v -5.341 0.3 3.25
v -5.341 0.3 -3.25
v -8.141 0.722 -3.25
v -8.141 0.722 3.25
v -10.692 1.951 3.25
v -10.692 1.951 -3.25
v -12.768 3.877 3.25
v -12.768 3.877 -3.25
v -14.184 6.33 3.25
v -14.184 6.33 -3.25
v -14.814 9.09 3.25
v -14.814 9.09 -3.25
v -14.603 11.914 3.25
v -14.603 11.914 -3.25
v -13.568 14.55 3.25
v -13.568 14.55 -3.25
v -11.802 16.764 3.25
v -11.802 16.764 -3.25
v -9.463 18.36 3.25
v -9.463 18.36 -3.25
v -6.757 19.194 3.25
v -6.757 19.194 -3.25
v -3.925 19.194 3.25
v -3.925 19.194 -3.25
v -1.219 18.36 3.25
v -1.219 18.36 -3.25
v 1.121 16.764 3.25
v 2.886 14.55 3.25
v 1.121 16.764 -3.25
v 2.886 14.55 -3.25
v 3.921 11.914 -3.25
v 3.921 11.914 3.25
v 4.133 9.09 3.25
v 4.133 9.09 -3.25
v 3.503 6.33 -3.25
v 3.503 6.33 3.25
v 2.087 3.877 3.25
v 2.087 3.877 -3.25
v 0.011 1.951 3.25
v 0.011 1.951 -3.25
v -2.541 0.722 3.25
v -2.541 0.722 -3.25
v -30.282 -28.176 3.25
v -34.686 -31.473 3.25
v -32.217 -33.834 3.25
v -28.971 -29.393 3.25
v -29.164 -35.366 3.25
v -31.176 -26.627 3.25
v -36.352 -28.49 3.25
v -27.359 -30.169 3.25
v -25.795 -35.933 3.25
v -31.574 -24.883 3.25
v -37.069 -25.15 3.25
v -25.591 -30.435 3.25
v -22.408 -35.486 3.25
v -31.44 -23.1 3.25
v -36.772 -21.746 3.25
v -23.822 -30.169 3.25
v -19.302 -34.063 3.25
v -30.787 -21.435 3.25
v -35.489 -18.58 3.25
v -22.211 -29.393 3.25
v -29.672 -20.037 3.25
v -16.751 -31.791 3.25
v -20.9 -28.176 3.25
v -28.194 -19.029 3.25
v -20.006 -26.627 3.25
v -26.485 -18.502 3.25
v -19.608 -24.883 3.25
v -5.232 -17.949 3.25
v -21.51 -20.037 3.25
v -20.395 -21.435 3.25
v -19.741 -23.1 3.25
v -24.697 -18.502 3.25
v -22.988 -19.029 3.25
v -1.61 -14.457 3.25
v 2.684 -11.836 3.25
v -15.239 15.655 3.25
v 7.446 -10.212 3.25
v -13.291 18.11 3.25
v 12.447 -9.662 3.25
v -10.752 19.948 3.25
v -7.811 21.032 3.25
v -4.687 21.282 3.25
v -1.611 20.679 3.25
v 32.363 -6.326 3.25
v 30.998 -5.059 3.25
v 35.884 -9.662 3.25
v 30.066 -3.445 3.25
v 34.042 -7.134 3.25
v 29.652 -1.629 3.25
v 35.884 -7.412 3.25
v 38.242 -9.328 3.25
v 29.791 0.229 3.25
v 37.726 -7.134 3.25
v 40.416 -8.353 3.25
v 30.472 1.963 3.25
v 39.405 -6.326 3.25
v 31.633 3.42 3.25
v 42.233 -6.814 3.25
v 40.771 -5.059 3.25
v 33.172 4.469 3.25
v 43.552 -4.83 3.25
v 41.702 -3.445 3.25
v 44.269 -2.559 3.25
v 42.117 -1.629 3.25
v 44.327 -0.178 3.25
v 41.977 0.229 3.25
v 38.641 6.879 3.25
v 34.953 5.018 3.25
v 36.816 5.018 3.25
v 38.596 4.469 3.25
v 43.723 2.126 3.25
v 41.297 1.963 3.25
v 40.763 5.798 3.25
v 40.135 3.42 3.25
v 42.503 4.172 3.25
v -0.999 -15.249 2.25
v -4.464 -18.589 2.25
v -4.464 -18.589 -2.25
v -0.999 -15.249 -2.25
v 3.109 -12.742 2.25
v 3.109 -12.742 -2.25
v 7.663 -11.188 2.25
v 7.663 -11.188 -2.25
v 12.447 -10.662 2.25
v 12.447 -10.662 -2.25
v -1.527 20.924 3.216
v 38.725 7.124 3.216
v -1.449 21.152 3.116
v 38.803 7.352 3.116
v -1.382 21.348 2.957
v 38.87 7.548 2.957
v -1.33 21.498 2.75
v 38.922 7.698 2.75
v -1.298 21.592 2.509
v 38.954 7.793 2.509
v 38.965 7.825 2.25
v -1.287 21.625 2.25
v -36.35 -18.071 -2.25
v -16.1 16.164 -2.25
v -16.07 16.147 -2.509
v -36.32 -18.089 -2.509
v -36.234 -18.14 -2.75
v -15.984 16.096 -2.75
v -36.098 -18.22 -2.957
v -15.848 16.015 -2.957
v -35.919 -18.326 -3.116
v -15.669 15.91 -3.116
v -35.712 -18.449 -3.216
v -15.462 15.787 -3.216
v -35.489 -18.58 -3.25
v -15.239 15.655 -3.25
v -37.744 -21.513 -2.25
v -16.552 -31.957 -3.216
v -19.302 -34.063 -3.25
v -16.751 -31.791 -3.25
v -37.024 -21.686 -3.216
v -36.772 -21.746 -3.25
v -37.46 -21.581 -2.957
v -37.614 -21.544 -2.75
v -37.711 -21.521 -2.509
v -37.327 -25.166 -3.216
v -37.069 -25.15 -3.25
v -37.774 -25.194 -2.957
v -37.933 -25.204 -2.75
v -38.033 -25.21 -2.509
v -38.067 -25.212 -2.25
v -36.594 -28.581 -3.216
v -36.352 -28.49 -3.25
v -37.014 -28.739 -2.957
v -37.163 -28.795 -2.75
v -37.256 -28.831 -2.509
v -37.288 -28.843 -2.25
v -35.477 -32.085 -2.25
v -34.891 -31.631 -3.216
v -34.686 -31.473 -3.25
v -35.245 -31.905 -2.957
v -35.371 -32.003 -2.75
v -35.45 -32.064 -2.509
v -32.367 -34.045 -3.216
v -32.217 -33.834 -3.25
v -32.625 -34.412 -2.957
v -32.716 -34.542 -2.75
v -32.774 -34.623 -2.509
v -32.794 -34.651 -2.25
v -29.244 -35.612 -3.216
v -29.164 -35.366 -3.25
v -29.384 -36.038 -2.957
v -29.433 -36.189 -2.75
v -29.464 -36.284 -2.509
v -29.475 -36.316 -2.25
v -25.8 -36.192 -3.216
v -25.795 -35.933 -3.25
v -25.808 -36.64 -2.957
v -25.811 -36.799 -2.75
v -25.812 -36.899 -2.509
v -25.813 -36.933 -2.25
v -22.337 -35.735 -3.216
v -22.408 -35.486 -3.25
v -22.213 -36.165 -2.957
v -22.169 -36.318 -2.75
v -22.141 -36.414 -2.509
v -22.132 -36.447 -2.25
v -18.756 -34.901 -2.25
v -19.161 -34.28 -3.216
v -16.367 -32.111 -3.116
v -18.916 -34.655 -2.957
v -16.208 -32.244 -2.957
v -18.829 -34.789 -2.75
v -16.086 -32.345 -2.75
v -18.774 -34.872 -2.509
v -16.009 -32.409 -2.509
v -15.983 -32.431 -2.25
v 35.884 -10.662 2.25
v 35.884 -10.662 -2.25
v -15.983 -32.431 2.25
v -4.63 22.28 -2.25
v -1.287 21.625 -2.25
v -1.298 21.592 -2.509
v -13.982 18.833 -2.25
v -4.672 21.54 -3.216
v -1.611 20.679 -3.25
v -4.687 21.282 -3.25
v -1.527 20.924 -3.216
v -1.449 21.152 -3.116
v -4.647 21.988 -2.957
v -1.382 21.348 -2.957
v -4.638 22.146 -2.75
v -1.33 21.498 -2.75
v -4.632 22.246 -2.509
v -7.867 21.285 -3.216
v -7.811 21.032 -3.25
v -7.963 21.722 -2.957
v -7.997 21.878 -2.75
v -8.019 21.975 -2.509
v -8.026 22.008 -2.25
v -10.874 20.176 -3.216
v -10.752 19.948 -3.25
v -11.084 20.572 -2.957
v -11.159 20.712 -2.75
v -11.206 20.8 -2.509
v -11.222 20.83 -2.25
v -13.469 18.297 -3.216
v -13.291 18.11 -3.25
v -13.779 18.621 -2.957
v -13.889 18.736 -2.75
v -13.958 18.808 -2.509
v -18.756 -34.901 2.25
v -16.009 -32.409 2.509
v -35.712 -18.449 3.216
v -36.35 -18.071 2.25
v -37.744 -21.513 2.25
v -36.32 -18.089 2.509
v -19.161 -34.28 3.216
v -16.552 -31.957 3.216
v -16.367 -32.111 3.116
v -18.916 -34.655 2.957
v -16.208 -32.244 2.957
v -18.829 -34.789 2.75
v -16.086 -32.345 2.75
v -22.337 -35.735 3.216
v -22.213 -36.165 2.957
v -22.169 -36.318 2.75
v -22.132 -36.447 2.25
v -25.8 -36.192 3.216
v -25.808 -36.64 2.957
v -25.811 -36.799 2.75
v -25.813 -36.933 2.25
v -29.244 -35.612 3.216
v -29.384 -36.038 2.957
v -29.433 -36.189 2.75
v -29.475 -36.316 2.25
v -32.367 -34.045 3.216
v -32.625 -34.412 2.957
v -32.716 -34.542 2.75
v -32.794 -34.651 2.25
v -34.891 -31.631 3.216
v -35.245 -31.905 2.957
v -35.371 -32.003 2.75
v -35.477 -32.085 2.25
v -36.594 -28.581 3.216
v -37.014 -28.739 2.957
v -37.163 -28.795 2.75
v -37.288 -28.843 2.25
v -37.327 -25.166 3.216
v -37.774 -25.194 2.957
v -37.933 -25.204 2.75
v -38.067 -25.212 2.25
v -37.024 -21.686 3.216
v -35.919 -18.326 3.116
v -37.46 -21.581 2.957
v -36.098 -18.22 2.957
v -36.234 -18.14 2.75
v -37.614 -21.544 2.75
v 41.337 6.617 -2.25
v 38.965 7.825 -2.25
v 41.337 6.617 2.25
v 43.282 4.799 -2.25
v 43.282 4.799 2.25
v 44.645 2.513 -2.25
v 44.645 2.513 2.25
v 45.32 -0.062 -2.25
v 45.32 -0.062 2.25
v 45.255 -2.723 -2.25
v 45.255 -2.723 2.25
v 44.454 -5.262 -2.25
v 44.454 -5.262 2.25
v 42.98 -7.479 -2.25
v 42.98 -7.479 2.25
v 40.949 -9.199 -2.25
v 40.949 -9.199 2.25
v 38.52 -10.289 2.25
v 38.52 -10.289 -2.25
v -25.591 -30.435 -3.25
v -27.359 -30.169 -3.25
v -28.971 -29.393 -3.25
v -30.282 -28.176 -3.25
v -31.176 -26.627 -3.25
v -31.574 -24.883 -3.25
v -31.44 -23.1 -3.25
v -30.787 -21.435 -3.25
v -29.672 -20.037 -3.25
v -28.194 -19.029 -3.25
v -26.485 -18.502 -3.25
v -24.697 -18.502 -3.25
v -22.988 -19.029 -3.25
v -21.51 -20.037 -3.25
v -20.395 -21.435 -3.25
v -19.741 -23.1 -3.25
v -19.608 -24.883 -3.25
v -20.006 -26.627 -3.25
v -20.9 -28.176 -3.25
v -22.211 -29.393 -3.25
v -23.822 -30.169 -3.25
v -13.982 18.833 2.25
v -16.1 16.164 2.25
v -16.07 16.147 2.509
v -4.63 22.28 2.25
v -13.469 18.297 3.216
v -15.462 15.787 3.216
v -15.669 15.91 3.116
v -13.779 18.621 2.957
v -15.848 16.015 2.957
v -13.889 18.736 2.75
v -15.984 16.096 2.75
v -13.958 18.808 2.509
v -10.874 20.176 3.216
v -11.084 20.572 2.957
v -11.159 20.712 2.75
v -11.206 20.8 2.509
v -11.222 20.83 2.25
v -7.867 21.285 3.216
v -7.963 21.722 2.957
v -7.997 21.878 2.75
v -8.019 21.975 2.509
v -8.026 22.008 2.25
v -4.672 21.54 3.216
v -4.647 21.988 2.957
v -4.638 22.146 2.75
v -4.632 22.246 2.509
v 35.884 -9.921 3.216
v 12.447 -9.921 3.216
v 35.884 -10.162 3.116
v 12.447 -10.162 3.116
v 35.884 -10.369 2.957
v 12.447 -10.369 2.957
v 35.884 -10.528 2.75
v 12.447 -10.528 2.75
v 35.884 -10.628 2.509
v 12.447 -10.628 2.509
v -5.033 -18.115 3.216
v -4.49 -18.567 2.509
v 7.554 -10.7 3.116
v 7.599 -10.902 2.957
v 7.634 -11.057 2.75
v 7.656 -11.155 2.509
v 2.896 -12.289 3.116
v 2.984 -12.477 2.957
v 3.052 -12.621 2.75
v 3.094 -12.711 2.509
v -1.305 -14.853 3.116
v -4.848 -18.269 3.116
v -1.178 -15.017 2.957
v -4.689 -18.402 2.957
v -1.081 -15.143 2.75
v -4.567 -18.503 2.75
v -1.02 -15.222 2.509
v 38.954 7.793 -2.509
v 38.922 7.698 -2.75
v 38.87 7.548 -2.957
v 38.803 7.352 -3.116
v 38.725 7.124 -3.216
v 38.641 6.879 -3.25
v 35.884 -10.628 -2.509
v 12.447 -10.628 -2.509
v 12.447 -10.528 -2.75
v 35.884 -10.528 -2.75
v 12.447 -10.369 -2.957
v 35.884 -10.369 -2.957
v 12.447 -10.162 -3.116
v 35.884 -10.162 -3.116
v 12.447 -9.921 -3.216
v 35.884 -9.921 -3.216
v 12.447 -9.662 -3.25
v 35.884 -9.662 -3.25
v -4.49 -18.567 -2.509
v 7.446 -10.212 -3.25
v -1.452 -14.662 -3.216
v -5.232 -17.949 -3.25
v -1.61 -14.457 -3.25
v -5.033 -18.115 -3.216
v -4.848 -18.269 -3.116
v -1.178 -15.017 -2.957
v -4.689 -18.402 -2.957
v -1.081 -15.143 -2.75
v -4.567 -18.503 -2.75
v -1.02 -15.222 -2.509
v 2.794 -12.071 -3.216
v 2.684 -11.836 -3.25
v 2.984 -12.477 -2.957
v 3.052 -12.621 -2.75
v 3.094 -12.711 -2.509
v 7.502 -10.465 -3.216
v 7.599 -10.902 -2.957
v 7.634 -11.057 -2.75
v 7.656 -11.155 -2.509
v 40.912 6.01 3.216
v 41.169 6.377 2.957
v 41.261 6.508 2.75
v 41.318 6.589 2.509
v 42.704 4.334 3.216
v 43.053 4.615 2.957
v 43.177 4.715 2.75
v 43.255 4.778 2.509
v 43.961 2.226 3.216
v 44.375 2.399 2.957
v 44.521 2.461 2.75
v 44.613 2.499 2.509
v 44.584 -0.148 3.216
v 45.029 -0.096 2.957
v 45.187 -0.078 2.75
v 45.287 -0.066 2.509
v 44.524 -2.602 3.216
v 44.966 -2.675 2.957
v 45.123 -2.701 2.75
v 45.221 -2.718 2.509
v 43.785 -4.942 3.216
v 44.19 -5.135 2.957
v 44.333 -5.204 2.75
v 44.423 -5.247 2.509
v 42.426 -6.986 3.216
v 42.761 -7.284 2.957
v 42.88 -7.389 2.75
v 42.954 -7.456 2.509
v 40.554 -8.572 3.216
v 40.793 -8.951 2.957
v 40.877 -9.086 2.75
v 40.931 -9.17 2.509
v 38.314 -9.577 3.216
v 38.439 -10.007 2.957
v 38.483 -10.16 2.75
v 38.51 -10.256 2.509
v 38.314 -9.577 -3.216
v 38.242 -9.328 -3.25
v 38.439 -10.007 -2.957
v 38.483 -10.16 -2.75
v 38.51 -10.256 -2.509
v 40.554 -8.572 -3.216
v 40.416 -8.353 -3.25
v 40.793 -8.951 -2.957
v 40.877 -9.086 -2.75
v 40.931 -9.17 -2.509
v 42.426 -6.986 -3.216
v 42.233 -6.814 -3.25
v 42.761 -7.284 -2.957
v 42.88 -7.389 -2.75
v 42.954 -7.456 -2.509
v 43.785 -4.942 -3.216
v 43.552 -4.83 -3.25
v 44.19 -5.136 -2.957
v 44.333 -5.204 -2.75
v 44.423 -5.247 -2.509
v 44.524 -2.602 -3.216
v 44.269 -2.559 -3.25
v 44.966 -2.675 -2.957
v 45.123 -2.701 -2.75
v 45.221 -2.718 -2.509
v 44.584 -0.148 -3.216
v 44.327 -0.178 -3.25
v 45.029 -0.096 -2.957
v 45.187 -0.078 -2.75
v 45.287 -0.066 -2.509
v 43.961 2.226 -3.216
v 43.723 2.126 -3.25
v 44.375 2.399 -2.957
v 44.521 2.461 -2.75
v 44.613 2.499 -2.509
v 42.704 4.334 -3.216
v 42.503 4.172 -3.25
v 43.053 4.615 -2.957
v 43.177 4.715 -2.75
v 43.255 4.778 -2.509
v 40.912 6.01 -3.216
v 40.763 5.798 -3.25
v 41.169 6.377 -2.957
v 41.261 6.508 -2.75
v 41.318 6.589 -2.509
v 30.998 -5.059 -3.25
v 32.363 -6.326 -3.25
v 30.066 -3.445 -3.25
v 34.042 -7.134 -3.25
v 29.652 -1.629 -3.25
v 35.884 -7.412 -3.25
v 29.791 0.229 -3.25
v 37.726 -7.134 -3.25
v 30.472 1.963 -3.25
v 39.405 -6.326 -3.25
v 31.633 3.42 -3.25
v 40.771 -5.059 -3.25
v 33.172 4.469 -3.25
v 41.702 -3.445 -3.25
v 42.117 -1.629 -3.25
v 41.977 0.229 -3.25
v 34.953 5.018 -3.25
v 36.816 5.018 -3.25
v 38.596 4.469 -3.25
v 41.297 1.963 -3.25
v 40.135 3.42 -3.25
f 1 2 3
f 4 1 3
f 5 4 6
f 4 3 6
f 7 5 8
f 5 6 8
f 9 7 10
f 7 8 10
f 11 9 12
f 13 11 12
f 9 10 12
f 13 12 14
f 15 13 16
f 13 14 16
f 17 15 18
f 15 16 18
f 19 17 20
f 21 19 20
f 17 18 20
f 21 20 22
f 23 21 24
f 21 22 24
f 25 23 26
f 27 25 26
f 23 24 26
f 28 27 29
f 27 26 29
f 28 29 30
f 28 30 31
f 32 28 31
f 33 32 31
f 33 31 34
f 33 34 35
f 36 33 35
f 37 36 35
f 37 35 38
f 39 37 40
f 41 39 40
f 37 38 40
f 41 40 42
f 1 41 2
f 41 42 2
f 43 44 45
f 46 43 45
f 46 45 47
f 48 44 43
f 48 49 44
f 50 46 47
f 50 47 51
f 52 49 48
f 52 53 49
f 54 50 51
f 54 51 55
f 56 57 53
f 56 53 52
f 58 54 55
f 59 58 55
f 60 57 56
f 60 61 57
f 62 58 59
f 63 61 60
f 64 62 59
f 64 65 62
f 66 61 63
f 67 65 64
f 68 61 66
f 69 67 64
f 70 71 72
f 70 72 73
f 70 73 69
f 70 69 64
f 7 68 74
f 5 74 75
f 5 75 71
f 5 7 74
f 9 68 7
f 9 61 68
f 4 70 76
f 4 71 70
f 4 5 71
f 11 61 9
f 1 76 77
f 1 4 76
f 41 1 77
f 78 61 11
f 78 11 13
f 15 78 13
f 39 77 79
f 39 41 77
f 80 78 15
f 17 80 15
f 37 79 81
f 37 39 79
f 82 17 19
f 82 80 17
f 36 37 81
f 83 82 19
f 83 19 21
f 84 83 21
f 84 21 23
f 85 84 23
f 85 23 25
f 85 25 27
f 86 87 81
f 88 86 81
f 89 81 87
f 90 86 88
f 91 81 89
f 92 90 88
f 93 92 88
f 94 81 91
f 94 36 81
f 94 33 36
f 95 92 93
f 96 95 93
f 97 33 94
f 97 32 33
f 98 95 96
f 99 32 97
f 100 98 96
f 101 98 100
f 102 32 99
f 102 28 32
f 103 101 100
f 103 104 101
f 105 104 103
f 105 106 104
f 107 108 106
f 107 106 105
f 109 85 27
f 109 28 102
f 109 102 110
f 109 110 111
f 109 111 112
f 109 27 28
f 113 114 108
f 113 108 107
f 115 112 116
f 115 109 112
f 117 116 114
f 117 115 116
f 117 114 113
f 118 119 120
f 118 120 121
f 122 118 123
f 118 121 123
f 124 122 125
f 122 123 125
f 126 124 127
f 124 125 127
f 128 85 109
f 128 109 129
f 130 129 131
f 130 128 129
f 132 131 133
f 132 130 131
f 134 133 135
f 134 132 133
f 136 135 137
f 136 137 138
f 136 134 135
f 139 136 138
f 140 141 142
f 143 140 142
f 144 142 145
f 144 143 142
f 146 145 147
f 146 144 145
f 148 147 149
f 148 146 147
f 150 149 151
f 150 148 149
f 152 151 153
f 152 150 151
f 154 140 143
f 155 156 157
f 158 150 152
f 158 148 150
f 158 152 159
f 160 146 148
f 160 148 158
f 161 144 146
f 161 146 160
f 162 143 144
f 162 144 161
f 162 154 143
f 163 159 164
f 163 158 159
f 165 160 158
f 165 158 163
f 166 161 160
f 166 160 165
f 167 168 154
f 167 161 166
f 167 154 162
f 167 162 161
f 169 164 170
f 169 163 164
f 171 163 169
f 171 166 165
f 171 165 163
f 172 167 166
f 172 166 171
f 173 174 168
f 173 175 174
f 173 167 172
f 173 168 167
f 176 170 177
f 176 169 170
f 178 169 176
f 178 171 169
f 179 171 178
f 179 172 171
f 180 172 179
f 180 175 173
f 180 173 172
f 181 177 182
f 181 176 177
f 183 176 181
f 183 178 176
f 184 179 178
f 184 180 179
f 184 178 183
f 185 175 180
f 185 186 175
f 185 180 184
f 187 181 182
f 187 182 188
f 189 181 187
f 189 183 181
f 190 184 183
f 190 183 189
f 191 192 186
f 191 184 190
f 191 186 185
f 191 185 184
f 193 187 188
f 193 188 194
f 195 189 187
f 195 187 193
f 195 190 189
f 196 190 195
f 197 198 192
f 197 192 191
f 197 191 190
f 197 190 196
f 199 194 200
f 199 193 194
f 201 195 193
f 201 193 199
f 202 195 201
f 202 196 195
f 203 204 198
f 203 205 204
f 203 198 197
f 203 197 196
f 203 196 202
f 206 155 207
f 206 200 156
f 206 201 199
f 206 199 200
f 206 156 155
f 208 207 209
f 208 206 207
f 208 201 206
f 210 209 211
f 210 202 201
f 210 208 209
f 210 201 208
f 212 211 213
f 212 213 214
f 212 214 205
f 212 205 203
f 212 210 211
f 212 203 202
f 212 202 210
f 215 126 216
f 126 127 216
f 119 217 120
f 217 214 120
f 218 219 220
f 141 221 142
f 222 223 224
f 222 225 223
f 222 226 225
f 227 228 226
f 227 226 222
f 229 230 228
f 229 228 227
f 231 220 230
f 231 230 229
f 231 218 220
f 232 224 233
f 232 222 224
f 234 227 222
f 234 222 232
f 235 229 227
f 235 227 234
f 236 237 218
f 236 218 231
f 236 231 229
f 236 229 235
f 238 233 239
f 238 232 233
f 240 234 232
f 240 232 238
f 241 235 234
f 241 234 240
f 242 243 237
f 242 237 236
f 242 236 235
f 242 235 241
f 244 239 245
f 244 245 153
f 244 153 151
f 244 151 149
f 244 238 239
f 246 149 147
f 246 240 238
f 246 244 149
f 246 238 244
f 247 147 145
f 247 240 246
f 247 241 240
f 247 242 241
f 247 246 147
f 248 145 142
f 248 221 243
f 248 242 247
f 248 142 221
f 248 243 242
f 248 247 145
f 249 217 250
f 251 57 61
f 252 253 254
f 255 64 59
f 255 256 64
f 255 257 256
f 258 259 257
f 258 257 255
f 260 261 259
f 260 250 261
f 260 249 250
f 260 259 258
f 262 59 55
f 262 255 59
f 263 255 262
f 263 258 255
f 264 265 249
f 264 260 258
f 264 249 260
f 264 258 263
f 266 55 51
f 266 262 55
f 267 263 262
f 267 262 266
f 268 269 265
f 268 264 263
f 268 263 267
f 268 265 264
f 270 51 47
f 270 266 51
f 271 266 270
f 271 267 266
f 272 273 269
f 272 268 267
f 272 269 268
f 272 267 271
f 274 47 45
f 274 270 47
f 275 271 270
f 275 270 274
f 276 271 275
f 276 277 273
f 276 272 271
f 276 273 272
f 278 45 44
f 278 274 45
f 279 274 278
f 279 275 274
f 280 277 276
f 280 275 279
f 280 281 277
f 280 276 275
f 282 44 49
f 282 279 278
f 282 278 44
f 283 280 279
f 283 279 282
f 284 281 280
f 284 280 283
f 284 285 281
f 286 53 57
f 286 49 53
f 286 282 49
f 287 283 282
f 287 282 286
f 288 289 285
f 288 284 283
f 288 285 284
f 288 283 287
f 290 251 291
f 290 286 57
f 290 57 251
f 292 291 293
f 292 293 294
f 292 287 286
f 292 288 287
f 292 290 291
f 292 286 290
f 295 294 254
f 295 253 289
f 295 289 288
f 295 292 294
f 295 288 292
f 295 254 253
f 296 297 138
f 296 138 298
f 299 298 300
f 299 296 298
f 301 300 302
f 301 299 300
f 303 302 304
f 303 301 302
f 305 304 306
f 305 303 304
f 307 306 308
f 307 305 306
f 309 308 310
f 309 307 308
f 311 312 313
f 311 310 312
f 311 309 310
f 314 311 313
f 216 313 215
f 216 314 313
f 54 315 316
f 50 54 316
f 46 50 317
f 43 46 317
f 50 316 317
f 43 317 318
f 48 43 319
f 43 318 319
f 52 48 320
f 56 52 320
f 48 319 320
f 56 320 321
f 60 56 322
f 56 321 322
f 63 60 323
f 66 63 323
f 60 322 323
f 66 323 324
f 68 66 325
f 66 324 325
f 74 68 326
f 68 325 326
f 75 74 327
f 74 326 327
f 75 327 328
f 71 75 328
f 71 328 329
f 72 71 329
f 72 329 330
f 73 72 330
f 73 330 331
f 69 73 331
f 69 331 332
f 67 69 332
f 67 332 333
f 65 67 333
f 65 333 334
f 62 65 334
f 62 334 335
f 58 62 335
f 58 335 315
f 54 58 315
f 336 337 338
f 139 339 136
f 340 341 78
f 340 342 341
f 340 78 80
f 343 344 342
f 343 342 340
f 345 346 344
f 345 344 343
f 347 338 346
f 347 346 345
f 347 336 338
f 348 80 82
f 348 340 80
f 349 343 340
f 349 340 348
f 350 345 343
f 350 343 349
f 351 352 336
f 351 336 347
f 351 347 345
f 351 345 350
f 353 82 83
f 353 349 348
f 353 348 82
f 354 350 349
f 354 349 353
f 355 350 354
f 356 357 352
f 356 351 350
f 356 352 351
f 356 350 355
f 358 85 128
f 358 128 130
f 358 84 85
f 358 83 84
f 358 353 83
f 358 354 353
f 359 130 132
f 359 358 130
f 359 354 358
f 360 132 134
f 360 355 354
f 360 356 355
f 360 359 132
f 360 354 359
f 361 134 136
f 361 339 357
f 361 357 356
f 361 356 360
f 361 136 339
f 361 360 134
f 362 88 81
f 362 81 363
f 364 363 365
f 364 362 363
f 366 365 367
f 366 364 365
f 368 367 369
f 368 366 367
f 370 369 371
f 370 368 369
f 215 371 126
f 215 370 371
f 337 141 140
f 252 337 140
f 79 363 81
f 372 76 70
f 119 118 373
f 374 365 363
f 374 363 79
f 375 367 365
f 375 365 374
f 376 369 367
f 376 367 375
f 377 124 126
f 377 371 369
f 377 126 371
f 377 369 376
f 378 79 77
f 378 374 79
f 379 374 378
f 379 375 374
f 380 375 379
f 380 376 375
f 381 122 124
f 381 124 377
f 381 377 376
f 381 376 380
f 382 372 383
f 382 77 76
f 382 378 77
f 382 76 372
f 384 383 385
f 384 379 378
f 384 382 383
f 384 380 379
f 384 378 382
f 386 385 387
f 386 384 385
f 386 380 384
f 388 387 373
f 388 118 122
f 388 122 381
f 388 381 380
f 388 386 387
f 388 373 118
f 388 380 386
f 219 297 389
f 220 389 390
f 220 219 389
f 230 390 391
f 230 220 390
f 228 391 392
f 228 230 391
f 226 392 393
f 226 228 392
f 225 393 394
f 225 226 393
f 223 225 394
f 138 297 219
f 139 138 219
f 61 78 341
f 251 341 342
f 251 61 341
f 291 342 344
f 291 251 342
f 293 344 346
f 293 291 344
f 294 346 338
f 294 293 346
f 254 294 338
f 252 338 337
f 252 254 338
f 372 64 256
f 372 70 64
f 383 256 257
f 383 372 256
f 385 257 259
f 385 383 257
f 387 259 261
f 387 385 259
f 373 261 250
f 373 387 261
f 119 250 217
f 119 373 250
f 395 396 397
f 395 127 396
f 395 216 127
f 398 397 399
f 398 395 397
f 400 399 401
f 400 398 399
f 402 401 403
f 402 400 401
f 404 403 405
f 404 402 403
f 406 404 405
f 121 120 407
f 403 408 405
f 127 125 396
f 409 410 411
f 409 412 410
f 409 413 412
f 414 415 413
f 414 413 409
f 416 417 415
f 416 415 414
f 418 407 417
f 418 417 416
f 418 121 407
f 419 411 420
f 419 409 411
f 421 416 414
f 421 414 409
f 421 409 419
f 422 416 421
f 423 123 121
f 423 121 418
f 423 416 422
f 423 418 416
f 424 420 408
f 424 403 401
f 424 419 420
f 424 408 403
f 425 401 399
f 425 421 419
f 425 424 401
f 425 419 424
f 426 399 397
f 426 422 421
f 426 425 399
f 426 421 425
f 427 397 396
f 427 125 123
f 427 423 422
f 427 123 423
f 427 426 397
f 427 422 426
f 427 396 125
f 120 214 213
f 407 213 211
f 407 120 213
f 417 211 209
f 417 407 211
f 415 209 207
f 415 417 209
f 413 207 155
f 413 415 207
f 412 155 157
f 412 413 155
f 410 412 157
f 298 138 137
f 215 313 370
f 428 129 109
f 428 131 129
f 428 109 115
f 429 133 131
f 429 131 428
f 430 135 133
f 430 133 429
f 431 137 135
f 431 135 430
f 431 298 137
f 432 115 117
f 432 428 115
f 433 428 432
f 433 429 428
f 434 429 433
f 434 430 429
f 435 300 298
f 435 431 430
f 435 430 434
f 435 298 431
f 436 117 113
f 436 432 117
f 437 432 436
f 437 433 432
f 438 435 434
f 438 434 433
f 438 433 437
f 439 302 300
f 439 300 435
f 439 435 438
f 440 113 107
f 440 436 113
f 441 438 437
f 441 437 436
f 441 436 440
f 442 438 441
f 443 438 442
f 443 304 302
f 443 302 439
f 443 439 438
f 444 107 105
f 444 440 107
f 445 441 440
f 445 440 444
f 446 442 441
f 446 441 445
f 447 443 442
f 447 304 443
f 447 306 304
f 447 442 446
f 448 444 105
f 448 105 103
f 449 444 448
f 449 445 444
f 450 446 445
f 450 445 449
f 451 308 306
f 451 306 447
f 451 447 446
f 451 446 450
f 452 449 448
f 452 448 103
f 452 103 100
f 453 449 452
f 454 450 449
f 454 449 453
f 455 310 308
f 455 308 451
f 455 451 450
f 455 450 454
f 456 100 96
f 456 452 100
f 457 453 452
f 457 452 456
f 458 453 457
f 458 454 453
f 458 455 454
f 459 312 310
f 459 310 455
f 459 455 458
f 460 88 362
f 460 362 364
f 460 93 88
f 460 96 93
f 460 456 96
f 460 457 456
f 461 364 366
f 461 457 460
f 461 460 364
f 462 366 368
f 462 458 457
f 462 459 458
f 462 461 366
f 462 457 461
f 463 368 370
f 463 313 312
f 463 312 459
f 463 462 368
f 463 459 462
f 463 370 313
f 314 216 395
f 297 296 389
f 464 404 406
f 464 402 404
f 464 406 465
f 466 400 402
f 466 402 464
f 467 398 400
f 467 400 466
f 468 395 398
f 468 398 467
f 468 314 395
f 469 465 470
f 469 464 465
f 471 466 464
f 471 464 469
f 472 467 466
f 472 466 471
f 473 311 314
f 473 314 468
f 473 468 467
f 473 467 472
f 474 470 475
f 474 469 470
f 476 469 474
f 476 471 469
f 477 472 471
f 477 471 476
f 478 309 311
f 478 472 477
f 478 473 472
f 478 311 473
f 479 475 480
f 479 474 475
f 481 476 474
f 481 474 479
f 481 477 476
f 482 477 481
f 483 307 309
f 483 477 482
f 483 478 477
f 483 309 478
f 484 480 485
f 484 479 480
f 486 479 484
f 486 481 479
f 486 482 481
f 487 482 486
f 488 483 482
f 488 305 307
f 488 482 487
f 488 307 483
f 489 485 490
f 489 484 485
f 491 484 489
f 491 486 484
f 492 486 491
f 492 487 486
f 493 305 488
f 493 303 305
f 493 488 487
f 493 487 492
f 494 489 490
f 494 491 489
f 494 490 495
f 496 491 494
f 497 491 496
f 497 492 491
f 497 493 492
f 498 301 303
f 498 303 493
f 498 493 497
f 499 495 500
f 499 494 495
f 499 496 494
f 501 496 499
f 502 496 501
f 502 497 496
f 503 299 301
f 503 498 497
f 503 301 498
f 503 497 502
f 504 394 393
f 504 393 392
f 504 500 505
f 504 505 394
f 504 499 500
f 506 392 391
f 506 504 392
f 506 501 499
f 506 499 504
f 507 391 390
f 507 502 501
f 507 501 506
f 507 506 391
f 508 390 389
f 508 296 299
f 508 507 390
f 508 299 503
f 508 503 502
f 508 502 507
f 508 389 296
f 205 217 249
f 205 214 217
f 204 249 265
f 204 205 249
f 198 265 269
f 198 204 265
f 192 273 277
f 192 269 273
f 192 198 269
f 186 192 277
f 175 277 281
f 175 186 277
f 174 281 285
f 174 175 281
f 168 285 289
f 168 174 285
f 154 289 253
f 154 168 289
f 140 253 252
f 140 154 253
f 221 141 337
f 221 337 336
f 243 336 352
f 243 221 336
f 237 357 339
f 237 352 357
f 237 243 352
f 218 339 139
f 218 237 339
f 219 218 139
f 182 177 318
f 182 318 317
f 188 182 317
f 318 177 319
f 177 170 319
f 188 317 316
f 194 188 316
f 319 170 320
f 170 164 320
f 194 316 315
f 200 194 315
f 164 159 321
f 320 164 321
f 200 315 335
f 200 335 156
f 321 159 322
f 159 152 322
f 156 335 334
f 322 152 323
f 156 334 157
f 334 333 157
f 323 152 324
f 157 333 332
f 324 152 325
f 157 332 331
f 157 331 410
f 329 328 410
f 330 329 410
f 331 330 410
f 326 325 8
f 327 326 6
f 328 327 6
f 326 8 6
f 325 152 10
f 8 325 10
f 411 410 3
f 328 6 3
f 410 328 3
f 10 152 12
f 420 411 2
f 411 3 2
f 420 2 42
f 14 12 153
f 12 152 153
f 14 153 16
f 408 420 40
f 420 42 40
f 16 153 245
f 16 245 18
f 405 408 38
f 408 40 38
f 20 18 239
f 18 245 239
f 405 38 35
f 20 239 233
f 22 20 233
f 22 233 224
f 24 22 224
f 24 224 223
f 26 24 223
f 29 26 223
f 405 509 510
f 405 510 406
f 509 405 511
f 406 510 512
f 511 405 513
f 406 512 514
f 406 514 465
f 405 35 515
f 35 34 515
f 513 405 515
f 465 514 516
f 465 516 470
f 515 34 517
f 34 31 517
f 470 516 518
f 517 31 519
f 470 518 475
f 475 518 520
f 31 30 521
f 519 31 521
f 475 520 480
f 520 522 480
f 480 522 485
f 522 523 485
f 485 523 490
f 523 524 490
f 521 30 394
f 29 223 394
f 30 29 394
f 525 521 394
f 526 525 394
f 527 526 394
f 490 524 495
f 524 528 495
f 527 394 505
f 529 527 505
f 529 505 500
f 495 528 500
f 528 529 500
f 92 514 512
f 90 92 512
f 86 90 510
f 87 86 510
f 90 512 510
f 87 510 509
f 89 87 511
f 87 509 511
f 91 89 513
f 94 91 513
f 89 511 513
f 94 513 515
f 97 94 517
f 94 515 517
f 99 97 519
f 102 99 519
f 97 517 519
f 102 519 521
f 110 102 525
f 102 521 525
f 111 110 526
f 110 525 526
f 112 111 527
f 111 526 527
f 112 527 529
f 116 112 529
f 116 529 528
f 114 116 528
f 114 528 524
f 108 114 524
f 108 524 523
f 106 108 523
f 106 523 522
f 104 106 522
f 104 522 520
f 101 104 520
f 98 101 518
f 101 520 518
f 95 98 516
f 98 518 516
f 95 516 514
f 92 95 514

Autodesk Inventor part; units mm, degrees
ref_plane "YZ Plane" through (0, 0, 0) normal (1, 0, 0) x (0, 1, 0)
ref_plane "XZ Plane" through (0, 0, 0) normal (0, 1, 0) x (-1, 0, 0)
ref_plane "XY Plane" through (0, 0, 0) normal (0, 0, 1) x (1, 0, 0)
sketch "Sketch1" plane through (0, 0, 0) normal (0, 0, 1) x (1, 0, 0)
  arc A0 (-36.3497, -18.0713) -> (-15.9827, -32.4309) centre (-25.5909, -24.4351) ccw
  arc A1 (35.8842, -10.6617) -> (38.9651, 7.8249) centre (35.8842, -1.1617) ccw
  arc A2 (-1.287, 21.6247) -> (-16.0996, 16.1641) centre (-5.3408, 9.8003) ccw
  arc A3 (12.4467, -10.6617) -> (-4.4637, -18.5891) centre (12.4467, -32.6617) ccw
  line L0 (-15.9827, -32.4309) -> (-4.4637, -18.5891)
  line L1 (12.4467, -10.6617) -> (35.8842, -10.6617)
  line L2 (38.9651, 7.8249) -> (-1.287, 21.6247)
  line L3 (-16.0996, 16.1641) -> (-36.3497, -18.0713)
  dimension "d0" = 12.5
  dimension "d1" = 9.5
  dimension "d2" = 12.5
  dimension "d3" = 22
extrude "Extrusion1" add sketch "Sketch1" along normal mid plane 6.5
sketch "Sketch2" plane through (0, 0, 3.25) normal (0, 0, 1) x (1, 0, 0)
  arc A0 (-36.3497, -18.0713) -> (-15.9827, -32.4309) centre (-25.5909, -24.4351) ccw projected
  arc A1 (-1.287, 21.6247) -> (-16.0996, 16.1641) centre (-5.3408, 9.8003) ccw projected
  arc A2 (35.8842, -10.6617) -> (38.9651, 7.8249) centre (35.8842, -1.1617) ccw projected
  line L0 (-36.3497, -18.0713) -> (-16.0996, 16.1641) projected
  line L1 (-4.4637, -18.5891) -> (-15.9827, -32.4309) projected
  arc A3 (12.4467, -10.6617) -> (-4.4637, -18.5891) centre (12.4467, -32.6617) ccw projected
  line L2 (35.8842, -10.6617) -> (12.4467, -10.6617) projected
  line L3 (-1.287, 21.6247) -> (38.9651, 7.8249) projected
hole "Hole1" at (-25.5909, -24.4351, 3.25) direction (0, 0, -1) diameter 12 end through all
sketch "Sketch3" plane through (0, 0, 3.25) normal (0, 0, 1) x (1, 0, 0)
  arc A0 (-1.287, 21.6247) -> (-16.0996, 16.1641) centre (-5.3408, 9.8003) ccw projected
hole "Hole2" at (-5.3408, 9.8003, 3.25) direction (0, 0, -1) diameter 19 end through all
sketch "Sketch4" plane through (0, 0, 3.25) normal (0, 0, 1) x (1, 0, 0)
  arc A0 (35.8842, -10.6617) -> (38.9651, 7.8249) centre (35.8842, -1.1617) ccw projected
hole "Hole3" at (35.8842, -1.1617, 3.25) direction (0, 0, -1) diameter 12.5 end through all
fillet "Fillet1" radius 1 16 edges at (18.8391, 14.7248, 3.25) (45.2549, -2.7234, 3.25) (24.1654, -10.6617, 3.25) (3.1086, -12.7419, 3.25) (-10.2232, -25.51, 3.25) (-32.7937, -34.6512, 3.25) (-26.2246, -0.9536, 3.25) (-9.6644, 21.5287, 3.25) (18.8391, 14.7248, -3.25) (-9.6644, 21.5287, -3.25) (-26.2246, -0.9536, -3.25) (-32.7937, -34.6512, -3.25) (-10.2232, -25.51, -3.25) (3.1086, -12.7419, -3.25) (24.1654, -10.6617, -3.25) (45.2549, -2.7234, -3.25)
properties part number "WeldExer_base"
